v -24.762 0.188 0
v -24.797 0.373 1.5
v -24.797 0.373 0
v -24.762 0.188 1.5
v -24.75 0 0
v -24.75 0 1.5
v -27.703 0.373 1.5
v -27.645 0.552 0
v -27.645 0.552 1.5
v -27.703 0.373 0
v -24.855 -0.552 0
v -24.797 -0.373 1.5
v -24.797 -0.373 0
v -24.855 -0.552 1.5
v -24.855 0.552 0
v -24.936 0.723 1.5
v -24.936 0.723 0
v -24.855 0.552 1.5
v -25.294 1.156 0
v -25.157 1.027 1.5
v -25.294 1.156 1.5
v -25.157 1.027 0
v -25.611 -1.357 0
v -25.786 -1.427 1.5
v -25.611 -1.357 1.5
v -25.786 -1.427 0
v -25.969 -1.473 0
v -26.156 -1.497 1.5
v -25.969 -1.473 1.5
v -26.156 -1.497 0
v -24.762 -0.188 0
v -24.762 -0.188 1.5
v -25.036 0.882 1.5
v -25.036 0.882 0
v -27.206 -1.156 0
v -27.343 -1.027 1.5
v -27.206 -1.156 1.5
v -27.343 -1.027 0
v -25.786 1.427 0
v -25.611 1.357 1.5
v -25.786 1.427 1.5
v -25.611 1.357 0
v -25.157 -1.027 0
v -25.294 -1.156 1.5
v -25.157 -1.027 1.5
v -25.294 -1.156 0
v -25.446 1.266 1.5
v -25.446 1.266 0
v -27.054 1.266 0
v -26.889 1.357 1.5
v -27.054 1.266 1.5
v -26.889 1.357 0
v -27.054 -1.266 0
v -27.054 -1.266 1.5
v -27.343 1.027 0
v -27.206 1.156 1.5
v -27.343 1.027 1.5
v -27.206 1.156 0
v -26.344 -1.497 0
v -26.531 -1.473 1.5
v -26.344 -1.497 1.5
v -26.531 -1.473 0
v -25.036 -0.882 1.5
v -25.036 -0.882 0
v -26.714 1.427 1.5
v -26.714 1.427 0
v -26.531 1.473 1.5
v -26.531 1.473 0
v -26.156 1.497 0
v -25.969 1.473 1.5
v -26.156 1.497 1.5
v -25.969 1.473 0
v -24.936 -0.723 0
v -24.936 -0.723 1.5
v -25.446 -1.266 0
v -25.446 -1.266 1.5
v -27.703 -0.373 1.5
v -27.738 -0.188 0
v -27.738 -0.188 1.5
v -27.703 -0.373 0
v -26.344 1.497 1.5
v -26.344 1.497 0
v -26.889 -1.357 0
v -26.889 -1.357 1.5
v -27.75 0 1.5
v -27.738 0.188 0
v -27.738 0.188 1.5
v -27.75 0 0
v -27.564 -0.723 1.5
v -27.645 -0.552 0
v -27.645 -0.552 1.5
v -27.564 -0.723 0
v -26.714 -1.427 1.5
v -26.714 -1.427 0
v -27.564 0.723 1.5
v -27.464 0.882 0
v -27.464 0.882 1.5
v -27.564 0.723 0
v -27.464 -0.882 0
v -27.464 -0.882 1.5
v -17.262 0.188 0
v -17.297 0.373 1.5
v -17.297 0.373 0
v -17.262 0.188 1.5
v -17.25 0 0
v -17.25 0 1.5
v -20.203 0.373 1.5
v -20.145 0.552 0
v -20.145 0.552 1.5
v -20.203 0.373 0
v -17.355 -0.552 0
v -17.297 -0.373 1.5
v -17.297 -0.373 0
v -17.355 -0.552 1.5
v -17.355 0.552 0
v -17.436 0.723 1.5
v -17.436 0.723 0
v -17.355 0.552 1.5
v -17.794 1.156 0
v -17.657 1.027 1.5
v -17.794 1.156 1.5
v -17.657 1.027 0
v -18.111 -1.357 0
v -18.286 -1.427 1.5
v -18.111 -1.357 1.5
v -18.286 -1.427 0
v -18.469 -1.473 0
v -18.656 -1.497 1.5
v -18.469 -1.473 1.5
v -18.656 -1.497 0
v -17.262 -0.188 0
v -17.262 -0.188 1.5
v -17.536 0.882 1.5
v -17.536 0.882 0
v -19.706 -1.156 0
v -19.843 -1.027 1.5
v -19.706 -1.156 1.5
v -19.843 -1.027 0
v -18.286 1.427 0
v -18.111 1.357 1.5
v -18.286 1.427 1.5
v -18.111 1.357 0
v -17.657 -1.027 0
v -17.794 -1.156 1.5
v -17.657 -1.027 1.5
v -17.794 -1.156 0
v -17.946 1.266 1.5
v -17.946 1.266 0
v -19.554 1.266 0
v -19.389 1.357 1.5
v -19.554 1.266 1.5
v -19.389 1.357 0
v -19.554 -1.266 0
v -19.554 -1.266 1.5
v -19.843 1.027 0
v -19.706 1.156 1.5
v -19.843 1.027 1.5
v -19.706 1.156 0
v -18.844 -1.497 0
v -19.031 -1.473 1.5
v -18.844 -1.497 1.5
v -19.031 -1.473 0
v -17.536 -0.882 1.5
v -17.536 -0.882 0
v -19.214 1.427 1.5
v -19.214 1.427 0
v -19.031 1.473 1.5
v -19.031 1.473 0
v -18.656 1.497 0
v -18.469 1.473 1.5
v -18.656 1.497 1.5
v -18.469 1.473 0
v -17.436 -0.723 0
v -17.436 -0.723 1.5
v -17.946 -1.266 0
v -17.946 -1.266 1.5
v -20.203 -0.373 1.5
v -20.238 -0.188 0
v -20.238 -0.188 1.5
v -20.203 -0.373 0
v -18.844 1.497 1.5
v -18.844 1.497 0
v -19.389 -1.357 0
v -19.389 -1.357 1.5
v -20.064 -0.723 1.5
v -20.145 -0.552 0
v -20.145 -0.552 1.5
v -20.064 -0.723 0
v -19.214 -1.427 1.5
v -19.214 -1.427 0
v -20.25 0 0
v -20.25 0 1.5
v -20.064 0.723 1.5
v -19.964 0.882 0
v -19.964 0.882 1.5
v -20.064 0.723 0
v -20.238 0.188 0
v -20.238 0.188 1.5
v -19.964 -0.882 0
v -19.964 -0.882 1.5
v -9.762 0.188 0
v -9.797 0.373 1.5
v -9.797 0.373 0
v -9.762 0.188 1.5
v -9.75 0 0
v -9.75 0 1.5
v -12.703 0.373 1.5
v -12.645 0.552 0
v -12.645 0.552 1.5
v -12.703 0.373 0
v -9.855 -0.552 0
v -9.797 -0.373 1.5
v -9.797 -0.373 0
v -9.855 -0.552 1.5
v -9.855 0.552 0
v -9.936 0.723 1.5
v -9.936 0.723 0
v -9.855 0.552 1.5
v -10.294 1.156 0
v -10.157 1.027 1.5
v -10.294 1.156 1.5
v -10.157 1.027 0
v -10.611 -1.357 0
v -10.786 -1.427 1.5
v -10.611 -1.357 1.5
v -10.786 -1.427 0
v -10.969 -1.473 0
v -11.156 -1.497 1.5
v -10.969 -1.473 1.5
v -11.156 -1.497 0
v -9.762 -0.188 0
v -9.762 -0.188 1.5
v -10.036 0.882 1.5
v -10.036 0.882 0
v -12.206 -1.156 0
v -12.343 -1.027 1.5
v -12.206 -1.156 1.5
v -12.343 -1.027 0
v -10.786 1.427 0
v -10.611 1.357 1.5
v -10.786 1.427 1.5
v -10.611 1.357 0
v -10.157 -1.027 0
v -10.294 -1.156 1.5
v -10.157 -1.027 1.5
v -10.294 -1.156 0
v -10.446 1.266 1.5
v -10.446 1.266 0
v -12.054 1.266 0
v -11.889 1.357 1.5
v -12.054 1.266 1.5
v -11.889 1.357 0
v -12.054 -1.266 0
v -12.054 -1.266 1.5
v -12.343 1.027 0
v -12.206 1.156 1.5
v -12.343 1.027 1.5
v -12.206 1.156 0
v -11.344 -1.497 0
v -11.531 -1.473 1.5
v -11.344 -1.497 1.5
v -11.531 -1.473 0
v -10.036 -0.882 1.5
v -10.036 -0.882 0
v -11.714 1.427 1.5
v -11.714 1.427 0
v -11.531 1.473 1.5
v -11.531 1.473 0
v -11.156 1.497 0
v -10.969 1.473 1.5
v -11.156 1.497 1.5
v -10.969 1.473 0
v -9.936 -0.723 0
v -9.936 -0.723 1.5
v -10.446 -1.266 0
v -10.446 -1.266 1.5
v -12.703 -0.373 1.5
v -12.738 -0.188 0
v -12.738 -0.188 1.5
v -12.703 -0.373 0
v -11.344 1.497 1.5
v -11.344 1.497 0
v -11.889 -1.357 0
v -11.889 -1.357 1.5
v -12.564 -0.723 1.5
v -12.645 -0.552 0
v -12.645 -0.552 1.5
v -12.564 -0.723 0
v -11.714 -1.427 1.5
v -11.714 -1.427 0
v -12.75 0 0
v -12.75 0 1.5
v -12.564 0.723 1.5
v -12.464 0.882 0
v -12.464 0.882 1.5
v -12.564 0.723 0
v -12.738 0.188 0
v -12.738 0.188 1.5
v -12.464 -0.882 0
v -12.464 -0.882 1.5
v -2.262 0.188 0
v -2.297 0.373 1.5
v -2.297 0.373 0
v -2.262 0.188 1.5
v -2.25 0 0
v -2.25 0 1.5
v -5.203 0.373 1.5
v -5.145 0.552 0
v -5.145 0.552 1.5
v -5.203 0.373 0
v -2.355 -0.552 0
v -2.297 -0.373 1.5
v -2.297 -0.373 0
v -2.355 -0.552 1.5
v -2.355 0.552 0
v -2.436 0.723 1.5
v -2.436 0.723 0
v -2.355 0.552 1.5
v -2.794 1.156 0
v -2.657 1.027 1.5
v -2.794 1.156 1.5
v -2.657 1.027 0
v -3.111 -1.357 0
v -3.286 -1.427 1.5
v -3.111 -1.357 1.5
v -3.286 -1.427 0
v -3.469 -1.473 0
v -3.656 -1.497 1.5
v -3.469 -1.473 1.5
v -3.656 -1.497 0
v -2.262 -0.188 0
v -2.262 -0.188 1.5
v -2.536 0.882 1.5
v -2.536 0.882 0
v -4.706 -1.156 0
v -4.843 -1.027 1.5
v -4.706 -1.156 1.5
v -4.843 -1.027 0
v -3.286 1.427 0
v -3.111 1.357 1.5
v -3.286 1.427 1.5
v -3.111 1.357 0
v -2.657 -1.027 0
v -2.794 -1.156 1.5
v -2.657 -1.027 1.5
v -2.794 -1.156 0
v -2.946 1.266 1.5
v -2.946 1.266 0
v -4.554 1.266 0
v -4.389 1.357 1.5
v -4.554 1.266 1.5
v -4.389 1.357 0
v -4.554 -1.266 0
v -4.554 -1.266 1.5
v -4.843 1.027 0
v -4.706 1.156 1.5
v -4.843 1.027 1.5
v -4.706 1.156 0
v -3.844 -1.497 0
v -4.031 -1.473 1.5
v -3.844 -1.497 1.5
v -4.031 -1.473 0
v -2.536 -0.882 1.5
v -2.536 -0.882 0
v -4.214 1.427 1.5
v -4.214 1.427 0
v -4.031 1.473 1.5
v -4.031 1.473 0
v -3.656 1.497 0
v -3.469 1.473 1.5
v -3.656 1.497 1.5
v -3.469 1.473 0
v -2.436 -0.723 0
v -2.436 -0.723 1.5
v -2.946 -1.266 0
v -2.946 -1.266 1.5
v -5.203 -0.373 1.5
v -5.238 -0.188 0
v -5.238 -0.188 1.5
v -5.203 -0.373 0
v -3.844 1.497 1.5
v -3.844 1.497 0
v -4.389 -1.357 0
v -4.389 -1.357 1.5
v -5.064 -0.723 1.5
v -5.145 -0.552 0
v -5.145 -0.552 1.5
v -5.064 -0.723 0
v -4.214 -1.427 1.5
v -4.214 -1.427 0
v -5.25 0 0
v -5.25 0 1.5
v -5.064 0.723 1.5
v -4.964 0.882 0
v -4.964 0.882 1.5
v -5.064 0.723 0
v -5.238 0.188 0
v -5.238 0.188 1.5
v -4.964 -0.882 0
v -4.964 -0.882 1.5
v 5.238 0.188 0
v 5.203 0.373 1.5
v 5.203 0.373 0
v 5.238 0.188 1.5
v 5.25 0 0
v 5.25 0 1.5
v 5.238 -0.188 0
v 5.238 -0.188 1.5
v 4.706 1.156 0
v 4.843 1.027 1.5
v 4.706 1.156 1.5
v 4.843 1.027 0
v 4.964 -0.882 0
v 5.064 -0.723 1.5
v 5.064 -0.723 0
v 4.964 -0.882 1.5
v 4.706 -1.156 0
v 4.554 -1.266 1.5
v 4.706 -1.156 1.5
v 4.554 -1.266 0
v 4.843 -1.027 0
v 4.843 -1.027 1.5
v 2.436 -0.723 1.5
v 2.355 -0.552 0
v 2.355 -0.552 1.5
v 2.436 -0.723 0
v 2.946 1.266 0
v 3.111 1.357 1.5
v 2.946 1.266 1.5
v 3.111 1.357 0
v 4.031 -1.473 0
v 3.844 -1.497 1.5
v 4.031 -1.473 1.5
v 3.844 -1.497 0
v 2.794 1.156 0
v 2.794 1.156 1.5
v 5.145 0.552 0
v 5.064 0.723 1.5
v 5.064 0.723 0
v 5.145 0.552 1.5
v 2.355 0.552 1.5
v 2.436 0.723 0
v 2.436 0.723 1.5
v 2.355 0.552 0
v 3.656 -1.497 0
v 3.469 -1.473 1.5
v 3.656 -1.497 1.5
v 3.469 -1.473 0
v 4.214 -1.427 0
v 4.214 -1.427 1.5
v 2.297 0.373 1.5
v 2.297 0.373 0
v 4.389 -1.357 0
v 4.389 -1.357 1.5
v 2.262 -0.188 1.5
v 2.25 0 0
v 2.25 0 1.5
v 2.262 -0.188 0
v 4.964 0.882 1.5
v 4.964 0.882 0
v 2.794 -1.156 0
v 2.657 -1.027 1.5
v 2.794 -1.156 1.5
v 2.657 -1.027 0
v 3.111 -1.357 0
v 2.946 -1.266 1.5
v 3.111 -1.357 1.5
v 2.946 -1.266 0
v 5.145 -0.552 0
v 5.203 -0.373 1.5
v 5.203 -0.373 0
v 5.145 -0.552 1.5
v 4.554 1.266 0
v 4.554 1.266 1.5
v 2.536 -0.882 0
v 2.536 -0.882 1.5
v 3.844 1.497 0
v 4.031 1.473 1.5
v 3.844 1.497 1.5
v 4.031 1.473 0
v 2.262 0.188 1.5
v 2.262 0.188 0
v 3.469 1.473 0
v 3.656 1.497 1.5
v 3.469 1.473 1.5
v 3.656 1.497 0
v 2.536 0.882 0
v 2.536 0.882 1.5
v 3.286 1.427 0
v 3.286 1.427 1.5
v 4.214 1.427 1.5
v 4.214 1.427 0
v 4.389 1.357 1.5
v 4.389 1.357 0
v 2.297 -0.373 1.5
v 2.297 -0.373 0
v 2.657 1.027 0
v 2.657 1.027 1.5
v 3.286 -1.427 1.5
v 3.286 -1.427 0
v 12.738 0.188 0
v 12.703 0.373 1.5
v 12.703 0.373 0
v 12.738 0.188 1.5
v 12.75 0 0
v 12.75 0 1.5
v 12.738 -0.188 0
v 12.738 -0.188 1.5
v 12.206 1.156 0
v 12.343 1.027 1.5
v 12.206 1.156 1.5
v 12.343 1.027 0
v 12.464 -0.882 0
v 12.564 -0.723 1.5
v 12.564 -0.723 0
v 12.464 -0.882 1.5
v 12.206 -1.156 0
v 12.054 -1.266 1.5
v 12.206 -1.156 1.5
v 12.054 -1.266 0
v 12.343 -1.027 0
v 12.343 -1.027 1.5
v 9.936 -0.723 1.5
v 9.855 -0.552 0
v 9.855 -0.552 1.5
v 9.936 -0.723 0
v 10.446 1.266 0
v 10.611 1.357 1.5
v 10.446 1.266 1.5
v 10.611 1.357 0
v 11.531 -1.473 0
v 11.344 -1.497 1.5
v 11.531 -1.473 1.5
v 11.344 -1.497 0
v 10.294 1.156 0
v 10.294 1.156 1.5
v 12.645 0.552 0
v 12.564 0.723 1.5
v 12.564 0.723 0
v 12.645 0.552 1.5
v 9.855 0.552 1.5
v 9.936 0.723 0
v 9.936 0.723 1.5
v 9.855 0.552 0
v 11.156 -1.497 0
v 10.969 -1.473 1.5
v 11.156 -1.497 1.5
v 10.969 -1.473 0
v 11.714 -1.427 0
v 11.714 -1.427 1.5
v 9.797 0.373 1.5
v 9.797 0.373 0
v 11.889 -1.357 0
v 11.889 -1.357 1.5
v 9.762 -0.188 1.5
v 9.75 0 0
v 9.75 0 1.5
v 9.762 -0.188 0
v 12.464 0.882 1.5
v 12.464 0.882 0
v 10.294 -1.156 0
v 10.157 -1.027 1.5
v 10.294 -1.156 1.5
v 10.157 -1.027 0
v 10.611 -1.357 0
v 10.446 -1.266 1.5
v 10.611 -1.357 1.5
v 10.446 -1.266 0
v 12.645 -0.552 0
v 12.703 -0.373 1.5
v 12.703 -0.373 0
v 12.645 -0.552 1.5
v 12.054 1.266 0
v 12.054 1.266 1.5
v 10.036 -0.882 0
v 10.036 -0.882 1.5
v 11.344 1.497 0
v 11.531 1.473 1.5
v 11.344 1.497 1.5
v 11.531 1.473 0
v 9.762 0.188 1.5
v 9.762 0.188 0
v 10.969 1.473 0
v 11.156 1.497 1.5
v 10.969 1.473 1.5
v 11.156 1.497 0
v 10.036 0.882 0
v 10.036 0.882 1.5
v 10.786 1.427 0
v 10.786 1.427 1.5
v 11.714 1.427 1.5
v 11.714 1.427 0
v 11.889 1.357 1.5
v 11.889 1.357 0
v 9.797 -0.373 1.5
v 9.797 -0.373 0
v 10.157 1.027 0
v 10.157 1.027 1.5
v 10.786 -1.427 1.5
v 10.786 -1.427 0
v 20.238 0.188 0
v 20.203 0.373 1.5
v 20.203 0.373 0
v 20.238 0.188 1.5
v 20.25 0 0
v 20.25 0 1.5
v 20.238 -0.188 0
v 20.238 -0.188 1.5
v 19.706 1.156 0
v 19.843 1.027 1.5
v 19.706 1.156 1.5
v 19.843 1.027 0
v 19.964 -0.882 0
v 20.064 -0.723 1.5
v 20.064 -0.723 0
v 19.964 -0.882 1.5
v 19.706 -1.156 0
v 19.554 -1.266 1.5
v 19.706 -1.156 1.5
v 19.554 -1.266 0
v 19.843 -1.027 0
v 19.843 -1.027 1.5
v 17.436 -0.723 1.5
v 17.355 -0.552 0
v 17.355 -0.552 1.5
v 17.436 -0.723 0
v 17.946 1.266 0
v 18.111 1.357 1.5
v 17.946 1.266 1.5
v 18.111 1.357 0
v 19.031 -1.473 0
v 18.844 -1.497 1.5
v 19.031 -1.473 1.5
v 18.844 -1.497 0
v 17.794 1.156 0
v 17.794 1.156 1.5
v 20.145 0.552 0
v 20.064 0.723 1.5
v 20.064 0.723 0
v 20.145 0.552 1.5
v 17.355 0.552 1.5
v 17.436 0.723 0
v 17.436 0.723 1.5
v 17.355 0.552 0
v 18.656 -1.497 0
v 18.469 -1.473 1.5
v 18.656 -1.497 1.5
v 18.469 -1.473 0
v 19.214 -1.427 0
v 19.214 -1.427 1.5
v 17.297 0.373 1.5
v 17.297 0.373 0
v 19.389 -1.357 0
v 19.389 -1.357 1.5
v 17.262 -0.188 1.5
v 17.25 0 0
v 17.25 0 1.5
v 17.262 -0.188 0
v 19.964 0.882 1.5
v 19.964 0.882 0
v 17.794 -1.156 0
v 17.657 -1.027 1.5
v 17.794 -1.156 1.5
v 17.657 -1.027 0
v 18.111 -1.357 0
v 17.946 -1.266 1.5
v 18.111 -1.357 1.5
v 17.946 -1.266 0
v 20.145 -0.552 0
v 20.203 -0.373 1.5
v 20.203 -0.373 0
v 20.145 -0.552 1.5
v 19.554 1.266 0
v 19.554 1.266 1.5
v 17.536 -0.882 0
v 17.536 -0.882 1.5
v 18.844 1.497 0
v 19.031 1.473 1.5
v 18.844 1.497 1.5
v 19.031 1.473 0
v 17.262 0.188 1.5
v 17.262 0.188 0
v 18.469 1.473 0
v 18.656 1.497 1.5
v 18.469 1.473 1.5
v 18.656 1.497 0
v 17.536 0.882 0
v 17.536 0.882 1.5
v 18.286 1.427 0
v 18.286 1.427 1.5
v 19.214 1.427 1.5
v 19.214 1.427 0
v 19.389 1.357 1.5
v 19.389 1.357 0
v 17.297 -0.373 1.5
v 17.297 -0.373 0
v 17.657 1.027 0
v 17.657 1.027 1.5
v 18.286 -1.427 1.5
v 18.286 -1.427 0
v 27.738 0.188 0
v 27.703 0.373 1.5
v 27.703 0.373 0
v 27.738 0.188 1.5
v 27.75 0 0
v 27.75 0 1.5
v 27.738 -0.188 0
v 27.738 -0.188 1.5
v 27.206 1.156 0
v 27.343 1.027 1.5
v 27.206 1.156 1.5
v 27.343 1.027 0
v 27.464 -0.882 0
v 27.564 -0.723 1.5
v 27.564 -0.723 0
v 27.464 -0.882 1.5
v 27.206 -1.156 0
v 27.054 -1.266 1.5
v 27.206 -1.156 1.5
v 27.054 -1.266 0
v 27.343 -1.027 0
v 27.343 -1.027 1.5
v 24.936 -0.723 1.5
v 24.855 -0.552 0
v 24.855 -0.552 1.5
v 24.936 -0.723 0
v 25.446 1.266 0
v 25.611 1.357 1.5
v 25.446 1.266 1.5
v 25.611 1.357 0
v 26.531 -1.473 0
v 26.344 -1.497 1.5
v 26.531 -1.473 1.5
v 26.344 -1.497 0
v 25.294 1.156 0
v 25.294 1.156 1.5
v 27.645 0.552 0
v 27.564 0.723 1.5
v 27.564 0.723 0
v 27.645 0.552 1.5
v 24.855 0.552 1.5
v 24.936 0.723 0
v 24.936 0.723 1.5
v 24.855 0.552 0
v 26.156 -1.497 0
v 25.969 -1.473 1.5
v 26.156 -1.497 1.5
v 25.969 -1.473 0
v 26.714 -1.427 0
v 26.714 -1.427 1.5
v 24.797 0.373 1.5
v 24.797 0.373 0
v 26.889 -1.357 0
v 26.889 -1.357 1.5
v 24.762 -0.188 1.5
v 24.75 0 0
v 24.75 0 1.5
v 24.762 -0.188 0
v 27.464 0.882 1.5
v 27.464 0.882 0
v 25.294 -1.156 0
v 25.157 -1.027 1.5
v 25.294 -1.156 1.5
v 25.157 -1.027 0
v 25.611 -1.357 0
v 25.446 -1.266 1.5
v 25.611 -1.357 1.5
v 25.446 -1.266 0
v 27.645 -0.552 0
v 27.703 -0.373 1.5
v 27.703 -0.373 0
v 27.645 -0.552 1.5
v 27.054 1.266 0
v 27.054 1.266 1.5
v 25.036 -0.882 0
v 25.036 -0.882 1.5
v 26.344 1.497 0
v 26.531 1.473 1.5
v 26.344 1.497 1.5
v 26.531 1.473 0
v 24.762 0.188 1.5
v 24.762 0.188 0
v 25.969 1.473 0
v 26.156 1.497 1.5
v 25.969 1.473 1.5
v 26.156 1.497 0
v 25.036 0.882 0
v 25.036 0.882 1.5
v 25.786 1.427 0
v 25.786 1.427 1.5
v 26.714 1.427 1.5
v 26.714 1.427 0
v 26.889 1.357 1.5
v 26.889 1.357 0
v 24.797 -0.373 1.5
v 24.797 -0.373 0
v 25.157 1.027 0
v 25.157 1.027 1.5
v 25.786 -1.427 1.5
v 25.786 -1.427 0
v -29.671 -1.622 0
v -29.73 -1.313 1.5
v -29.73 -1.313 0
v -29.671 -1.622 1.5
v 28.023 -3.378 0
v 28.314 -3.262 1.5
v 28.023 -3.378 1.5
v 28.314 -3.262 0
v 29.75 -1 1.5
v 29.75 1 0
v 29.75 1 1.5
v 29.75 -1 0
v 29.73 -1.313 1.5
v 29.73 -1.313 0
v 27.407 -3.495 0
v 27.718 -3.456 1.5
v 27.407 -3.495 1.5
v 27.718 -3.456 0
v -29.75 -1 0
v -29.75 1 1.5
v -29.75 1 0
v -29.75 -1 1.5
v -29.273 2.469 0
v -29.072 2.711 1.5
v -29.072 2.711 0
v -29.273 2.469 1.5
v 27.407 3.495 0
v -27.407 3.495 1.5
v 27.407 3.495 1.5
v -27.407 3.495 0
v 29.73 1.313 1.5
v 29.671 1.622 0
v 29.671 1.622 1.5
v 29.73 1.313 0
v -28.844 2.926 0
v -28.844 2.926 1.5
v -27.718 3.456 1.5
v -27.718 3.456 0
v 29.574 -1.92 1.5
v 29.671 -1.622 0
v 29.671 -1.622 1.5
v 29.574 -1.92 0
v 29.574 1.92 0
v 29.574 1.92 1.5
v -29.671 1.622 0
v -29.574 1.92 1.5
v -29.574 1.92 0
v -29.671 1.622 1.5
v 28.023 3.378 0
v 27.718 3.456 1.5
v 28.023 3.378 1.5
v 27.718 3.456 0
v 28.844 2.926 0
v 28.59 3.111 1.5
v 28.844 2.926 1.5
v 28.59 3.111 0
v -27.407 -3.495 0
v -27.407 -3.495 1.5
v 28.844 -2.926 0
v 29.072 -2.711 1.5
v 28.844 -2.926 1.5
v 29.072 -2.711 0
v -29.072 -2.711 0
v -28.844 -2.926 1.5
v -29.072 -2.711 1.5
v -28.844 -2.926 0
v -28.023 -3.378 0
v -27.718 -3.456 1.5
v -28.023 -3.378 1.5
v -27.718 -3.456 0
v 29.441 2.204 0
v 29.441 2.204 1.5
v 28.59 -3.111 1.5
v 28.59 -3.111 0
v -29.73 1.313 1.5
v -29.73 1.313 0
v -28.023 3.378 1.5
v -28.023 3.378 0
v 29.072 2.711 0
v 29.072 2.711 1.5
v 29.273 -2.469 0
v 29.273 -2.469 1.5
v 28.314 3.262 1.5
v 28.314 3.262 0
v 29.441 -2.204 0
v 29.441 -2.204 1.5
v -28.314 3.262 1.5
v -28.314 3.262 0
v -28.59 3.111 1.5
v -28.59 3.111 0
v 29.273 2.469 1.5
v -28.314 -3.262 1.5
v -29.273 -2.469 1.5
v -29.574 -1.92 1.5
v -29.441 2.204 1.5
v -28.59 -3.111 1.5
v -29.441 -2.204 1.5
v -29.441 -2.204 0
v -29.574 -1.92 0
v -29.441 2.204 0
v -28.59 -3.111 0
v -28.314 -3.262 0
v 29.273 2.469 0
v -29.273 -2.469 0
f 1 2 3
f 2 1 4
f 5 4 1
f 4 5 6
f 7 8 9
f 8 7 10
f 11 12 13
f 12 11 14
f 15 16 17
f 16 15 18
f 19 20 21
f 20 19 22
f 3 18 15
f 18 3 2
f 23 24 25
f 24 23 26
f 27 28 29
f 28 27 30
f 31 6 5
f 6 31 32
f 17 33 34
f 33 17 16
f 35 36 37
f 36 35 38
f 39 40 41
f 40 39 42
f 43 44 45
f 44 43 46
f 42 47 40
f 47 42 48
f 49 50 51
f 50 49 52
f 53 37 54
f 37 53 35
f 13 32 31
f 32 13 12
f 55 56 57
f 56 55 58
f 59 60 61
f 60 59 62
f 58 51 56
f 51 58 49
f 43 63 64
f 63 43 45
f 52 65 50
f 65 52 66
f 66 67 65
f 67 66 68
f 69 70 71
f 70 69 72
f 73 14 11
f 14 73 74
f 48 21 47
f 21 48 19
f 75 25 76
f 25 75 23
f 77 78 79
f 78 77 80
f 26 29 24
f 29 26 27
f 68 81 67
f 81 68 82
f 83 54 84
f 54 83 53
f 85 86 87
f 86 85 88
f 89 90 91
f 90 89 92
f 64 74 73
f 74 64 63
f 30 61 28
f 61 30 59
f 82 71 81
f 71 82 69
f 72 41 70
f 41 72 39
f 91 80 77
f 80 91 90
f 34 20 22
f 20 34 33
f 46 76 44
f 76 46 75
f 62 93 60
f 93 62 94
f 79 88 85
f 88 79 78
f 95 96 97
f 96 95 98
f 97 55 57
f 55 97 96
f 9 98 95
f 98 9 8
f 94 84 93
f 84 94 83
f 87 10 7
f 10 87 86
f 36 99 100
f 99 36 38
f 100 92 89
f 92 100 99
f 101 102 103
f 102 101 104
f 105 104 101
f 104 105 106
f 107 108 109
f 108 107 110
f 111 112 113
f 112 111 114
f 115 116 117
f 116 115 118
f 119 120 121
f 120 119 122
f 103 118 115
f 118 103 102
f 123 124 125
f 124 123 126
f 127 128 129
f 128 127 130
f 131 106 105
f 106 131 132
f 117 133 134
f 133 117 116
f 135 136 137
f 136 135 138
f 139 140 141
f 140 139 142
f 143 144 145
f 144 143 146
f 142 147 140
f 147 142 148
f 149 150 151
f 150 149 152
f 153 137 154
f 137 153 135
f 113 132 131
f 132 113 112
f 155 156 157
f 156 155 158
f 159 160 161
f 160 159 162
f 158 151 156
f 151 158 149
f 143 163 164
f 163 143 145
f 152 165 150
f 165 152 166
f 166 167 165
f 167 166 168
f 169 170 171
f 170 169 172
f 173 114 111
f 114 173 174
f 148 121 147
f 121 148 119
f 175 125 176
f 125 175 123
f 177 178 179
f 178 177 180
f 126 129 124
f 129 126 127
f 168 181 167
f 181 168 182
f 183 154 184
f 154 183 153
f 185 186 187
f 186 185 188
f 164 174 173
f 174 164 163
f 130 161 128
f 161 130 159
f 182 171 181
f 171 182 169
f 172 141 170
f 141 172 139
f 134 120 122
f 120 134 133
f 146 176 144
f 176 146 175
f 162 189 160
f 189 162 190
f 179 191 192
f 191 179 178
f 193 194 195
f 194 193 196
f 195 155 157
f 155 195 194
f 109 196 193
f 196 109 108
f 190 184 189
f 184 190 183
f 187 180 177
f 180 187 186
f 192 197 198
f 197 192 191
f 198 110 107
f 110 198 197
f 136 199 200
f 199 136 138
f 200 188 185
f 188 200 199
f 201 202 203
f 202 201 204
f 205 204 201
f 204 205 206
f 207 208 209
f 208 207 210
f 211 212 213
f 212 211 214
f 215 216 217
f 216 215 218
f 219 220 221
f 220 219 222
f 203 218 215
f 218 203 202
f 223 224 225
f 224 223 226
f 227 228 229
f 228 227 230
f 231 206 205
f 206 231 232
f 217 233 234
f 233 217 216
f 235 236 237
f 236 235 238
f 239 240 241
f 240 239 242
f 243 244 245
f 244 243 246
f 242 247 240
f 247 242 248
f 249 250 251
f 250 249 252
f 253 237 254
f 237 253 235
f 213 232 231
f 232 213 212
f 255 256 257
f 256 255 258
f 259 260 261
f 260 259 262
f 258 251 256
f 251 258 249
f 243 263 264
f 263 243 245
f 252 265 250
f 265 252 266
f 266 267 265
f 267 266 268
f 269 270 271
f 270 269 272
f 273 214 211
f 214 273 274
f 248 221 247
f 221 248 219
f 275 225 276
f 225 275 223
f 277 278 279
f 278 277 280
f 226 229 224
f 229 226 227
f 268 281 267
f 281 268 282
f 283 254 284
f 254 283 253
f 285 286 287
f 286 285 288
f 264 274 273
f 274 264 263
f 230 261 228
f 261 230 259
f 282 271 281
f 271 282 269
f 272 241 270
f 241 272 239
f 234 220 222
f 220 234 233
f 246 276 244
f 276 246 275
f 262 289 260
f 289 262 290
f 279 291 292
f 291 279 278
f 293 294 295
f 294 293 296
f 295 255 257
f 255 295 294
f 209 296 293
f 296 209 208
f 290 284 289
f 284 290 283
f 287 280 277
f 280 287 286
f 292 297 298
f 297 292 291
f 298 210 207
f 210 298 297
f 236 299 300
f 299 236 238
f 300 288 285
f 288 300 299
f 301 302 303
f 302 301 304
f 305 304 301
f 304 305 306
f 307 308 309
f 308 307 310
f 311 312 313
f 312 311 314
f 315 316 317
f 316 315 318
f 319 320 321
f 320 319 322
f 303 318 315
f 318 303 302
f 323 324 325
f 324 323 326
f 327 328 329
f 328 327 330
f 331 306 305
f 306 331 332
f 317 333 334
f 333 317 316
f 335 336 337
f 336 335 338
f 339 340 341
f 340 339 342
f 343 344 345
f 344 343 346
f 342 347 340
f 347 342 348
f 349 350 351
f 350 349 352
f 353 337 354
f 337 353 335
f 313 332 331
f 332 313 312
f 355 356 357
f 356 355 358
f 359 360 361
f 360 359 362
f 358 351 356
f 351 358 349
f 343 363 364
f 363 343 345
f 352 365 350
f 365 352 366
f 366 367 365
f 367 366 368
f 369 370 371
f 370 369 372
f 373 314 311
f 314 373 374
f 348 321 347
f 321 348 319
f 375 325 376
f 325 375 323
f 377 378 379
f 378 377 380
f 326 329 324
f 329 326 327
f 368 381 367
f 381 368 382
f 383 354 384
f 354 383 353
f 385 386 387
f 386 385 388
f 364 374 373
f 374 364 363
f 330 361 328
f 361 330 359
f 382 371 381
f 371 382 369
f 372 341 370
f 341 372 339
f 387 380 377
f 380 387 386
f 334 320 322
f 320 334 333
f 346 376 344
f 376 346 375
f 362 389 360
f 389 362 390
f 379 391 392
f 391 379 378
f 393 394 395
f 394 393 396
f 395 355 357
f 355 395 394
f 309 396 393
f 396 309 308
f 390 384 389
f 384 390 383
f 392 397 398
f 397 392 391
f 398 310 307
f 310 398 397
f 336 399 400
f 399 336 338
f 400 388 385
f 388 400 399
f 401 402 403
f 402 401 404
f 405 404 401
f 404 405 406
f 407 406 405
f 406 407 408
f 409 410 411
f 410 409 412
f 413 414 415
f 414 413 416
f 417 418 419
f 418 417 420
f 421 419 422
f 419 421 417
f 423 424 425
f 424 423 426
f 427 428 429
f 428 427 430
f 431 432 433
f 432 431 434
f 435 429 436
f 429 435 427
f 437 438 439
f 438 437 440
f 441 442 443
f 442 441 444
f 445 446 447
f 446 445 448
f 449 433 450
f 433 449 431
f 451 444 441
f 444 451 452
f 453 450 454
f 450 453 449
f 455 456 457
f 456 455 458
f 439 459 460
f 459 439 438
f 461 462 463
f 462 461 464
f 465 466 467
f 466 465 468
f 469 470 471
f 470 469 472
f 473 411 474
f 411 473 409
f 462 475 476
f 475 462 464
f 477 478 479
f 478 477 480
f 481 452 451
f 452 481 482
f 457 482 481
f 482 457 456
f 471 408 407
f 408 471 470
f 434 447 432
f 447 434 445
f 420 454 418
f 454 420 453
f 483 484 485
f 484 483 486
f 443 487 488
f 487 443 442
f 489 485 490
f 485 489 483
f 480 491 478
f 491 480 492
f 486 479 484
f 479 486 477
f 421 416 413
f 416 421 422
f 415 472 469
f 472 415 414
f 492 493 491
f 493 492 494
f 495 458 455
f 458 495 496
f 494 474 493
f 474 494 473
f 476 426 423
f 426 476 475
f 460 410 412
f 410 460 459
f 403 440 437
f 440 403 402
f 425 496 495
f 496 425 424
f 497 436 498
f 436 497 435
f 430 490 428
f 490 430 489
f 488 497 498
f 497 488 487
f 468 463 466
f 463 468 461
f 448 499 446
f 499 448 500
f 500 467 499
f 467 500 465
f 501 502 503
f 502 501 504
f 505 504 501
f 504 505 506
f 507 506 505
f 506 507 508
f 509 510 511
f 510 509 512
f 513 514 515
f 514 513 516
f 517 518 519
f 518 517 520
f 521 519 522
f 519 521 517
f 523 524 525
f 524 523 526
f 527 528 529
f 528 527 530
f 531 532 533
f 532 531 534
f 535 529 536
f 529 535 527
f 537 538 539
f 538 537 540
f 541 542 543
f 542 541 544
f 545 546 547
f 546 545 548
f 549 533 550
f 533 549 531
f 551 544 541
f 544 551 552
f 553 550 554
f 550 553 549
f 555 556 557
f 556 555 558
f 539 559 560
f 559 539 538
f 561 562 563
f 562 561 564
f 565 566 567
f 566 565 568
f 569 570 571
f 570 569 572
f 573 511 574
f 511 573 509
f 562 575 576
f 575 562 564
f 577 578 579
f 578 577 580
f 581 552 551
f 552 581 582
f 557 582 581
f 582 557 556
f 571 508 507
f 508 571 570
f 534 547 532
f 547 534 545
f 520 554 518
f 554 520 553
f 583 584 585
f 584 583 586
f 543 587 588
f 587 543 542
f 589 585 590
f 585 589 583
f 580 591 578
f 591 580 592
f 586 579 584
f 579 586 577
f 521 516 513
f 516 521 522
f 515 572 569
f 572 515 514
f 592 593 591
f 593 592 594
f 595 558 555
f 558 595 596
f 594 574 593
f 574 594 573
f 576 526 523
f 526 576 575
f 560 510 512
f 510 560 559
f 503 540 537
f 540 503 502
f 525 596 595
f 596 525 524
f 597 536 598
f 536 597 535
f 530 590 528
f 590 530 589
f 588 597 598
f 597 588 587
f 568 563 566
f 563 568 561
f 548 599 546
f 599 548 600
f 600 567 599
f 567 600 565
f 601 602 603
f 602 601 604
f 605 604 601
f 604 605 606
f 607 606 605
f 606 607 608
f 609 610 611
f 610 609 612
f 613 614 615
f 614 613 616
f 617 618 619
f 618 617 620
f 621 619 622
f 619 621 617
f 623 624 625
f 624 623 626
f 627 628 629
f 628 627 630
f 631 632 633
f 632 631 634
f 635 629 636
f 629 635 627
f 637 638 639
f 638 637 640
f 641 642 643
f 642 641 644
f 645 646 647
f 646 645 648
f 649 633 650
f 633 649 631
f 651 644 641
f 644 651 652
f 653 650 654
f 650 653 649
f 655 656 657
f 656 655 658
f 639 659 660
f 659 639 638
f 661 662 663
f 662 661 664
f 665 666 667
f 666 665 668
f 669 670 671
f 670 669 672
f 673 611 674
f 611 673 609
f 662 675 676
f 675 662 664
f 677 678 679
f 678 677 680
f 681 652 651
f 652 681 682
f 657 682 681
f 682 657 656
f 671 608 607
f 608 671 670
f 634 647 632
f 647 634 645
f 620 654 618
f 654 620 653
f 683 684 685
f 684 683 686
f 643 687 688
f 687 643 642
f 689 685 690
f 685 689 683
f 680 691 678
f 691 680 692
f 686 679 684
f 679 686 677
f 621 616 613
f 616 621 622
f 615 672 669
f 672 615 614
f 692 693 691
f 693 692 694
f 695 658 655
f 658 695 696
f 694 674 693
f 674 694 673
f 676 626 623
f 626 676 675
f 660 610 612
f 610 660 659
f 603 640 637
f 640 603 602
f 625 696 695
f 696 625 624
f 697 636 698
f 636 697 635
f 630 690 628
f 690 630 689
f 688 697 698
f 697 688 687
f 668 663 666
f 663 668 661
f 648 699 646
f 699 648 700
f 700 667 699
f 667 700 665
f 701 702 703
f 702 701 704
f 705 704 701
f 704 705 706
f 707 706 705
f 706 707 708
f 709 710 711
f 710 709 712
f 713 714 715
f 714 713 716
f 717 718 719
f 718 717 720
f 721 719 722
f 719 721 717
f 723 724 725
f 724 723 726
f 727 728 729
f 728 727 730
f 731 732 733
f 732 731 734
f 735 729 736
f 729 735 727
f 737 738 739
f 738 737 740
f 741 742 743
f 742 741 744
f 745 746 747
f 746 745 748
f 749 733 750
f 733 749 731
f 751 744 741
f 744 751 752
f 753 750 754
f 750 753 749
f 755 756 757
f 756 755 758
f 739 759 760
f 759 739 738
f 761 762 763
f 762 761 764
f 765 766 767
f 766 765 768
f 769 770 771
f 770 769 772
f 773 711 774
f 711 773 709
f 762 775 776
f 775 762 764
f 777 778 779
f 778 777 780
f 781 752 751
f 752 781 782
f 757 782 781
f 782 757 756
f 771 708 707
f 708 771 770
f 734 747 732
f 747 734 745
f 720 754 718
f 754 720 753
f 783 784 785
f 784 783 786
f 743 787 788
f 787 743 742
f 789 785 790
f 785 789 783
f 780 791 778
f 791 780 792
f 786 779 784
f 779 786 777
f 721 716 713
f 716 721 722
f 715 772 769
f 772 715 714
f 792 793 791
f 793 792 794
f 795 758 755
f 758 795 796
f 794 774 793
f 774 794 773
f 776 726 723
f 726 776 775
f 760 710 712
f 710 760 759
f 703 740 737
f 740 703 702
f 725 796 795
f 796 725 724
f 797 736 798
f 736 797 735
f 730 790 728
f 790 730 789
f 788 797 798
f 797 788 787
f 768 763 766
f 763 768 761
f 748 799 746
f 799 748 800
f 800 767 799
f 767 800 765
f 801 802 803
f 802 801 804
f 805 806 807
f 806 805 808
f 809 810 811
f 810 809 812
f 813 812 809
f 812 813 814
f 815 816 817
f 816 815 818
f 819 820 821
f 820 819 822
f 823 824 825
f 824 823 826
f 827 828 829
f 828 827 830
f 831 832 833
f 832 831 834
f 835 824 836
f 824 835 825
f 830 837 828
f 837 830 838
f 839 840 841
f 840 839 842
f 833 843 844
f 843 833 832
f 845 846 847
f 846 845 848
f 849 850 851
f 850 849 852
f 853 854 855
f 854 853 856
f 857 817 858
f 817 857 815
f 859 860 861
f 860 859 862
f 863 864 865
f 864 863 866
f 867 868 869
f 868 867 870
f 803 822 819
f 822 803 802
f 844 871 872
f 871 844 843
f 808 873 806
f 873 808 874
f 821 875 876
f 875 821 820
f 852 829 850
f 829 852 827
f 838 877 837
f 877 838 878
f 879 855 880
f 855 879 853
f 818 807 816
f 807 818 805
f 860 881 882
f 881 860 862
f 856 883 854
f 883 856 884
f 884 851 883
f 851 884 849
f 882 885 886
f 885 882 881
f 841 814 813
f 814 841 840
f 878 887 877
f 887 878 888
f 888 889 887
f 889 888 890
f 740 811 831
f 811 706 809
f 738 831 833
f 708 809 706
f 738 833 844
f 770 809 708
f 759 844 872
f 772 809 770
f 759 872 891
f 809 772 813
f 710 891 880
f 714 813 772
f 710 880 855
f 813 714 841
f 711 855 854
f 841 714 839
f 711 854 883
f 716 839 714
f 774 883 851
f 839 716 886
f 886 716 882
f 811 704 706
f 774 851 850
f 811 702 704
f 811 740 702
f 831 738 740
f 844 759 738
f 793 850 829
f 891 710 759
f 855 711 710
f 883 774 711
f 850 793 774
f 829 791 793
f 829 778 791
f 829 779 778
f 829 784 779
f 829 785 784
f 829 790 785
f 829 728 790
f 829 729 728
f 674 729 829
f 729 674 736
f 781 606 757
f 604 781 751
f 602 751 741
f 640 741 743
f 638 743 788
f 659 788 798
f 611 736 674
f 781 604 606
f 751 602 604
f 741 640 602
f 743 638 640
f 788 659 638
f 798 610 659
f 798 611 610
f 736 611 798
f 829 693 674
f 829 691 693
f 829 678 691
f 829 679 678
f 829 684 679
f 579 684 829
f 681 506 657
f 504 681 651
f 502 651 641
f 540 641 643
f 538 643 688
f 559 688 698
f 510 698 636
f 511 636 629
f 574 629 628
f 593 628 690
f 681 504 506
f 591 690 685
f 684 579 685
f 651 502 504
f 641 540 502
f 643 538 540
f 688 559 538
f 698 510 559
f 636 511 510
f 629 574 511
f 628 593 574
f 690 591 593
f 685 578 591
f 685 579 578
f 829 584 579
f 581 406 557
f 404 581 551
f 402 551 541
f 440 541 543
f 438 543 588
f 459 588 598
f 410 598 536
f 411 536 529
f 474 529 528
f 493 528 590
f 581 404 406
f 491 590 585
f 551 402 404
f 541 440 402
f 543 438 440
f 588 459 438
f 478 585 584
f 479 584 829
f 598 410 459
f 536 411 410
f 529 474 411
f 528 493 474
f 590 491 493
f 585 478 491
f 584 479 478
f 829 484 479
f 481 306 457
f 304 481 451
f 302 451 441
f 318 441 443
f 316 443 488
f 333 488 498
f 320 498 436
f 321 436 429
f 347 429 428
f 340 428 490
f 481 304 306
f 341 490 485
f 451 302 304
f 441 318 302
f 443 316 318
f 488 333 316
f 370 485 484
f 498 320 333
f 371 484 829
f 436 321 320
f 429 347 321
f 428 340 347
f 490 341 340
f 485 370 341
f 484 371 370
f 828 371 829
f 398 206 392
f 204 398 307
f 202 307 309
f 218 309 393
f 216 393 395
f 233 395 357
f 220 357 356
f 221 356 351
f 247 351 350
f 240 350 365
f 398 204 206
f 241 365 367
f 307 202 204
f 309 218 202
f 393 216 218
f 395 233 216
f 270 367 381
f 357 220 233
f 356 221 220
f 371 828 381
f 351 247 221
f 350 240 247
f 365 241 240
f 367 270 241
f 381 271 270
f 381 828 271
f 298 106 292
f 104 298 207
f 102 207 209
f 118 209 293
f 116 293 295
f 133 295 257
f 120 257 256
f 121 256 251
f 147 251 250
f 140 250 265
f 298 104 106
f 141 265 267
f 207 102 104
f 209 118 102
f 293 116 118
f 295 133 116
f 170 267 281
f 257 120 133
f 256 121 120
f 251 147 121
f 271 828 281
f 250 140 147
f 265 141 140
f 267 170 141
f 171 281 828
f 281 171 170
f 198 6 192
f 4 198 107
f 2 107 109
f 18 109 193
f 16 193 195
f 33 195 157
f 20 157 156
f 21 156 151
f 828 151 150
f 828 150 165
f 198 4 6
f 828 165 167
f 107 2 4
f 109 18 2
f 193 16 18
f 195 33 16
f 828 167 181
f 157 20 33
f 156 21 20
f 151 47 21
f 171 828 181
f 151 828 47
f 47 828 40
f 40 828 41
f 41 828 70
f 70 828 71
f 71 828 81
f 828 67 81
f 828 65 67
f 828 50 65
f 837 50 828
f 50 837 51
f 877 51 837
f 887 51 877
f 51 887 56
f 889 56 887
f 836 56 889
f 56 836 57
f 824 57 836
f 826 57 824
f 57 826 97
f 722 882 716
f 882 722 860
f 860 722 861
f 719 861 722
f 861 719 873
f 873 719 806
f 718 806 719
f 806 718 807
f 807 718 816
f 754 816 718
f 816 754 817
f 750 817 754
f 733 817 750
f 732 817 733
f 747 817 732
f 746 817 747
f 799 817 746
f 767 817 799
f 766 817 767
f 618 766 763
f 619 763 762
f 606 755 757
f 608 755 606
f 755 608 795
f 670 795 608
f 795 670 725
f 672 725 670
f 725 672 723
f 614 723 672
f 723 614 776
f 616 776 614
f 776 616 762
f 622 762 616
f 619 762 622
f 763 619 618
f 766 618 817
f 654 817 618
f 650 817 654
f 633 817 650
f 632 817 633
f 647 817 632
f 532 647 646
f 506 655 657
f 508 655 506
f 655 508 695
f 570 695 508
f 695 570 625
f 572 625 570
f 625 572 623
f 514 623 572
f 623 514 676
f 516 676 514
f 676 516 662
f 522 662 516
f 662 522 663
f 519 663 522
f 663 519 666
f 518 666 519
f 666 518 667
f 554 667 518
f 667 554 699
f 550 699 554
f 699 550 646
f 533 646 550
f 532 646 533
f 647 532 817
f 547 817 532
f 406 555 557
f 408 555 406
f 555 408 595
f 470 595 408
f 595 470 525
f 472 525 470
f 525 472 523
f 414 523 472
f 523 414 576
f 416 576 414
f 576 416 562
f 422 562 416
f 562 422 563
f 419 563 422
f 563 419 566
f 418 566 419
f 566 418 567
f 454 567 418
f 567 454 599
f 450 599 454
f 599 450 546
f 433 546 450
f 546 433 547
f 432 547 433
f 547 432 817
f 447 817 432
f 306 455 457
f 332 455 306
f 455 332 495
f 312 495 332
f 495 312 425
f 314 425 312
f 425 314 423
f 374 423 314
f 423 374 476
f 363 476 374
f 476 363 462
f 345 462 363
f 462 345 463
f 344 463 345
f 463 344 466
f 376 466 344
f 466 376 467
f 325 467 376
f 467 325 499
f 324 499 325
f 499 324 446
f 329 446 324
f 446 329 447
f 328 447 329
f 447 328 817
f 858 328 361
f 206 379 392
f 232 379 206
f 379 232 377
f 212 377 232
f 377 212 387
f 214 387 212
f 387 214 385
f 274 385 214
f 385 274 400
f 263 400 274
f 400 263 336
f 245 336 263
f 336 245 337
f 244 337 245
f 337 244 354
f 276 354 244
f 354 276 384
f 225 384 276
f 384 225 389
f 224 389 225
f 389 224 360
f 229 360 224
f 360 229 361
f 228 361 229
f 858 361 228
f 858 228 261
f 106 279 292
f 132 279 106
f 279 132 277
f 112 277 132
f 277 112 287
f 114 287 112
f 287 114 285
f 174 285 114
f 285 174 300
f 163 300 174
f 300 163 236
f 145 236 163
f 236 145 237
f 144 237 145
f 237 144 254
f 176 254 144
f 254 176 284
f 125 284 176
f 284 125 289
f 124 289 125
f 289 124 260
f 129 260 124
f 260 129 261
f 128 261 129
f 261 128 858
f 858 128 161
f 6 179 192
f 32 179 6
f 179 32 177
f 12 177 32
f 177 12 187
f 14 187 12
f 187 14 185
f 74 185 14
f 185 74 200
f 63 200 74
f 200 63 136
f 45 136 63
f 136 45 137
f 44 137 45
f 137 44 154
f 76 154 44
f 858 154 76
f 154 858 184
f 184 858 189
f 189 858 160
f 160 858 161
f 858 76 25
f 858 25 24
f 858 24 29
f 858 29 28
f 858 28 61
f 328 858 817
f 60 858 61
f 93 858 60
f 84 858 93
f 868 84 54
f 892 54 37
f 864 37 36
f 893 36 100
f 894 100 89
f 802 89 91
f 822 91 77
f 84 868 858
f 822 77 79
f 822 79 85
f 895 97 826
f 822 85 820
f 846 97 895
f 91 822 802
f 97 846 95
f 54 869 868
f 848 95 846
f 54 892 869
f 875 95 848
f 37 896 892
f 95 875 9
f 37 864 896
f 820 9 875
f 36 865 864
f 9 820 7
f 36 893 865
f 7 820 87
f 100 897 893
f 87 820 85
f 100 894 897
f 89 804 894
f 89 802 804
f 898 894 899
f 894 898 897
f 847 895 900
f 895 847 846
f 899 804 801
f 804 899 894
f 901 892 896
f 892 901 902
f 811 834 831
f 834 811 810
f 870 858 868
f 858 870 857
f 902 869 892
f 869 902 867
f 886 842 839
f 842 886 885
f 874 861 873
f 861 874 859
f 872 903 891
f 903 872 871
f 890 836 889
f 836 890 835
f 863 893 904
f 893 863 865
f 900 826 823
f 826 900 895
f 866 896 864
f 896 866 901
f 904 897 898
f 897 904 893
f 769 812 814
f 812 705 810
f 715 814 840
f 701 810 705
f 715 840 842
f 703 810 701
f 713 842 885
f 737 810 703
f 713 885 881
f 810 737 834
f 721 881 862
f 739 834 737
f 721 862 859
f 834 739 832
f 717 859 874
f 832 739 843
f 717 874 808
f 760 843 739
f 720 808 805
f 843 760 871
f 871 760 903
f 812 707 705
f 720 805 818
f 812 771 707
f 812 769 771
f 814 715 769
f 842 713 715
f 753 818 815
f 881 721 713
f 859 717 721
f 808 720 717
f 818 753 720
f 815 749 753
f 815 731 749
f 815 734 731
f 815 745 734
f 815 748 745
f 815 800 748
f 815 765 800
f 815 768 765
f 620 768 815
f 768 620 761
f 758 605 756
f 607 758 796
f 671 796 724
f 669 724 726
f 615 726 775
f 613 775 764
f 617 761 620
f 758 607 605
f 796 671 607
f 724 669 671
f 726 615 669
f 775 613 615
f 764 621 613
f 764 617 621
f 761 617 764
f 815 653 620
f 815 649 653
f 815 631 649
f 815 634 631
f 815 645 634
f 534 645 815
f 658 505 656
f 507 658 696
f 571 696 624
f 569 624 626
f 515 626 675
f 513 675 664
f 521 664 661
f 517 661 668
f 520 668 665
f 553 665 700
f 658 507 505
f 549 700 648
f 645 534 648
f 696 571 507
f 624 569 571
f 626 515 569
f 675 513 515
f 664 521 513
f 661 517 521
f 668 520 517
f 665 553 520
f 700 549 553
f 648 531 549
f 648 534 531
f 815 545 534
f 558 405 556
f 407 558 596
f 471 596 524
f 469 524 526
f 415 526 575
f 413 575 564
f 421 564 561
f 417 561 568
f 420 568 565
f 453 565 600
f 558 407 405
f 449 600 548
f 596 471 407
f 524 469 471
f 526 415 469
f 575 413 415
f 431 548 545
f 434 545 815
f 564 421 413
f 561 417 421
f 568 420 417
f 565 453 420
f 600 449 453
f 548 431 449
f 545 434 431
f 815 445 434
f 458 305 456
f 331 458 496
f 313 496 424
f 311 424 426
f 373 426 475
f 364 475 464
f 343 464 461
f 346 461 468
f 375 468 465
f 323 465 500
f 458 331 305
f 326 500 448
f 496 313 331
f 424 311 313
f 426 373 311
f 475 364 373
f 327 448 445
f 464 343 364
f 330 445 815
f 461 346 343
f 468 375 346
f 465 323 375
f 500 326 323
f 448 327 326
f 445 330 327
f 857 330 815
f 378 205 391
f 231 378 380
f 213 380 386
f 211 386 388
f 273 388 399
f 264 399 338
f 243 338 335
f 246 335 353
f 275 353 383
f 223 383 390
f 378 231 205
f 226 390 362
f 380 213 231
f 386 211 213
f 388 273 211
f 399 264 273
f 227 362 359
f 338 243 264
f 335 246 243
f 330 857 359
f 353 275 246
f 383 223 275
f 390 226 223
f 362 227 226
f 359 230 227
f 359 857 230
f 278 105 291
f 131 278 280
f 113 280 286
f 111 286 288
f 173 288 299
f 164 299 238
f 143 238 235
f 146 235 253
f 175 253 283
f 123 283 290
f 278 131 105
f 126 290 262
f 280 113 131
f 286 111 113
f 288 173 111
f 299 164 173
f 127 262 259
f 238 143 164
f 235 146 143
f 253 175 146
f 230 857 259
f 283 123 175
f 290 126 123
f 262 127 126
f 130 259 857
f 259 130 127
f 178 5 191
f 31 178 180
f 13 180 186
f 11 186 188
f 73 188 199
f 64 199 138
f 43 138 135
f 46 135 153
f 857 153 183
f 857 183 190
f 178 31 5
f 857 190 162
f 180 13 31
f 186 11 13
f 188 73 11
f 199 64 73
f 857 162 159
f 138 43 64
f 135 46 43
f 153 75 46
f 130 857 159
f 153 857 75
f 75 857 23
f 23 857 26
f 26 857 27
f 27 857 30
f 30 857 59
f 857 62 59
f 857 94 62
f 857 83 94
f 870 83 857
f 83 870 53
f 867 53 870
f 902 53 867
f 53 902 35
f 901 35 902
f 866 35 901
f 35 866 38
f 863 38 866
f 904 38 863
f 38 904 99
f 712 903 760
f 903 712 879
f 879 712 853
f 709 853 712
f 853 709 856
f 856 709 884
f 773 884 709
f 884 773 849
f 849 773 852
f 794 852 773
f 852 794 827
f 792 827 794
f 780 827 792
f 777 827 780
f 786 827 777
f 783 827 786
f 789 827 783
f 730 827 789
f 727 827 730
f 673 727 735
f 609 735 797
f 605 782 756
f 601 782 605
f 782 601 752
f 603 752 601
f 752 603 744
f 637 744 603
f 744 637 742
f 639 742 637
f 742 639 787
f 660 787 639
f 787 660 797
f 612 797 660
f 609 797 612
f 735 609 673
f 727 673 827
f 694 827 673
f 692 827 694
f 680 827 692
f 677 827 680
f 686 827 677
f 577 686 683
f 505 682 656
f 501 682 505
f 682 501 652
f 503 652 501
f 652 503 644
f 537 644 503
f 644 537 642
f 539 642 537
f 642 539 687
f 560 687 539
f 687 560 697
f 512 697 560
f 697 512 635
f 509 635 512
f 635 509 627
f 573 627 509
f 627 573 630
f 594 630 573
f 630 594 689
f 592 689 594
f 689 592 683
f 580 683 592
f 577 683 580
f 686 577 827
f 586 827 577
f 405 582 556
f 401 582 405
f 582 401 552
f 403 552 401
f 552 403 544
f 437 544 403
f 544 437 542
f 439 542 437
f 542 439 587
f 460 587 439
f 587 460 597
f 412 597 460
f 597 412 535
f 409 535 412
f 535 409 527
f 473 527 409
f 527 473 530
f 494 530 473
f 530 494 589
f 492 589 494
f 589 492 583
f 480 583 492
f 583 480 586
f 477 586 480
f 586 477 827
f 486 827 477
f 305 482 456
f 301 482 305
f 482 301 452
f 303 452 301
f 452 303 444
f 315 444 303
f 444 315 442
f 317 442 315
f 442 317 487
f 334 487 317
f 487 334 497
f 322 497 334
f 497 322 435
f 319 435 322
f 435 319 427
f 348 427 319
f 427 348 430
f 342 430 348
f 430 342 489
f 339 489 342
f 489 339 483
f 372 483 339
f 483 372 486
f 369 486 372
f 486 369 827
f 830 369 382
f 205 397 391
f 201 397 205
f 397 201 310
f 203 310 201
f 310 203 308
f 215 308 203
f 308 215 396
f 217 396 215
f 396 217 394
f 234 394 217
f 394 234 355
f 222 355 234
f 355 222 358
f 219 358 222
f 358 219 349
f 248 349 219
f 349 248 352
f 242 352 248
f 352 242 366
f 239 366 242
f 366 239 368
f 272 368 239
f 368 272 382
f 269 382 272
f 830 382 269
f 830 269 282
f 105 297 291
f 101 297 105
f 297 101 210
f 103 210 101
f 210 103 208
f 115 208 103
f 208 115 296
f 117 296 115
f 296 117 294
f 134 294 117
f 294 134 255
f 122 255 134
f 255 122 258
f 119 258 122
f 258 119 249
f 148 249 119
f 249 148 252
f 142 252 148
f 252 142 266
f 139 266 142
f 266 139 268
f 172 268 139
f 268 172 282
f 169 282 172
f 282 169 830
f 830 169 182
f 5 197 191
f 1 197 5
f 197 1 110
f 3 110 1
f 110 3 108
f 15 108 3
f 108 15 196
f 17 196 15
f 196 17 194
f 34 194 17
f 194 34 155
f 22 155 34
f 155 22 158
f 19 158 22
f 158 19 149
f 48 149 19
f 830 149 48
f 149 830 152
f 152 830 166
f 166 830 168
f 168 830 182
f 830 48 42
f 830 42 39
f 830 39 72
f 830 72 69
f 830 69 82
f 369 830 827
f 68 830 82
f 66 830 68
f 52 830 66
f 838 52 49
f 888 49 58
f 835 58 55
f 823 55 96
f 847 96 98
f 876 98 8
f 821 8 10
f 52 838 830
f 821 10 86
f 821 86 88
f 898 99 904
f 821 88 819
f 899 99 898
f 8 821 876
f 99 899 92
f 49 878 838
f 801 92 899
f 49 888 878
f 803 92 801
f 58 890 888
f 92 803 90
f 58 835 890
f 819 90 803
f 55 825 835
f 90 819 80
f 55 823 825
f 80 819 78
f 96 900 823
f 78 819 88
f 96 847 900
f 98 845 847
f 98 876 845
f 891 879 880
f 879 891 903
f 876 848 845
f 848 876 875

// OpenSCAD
$fn = 50;


difference() {
	union() {
		translate(v = [0, 0, 0]) {
			rotate(a = [0, 0, 0]) {
				hull() {
					translate(v = [-27.2500000000, 1.0000000000, 0]) {
						rotate(a = [0, 0, 0]) {
							translate(v = [0, 0, 0]) {
								rotate(a = [0, 0, 0]) {
									cylinder(h = 1.5000000000, r = 2.5000000000);
								}
							}
						}
					}
					translate(v = [27.2500000000, 1.0000000000, 0]) {
						rotate(a = [0, 0, 0]) {
							translate(v = [0, 0, 0]) {
								rotate(a = [0, 0, 0]) {
									cylinder(h = 1.5000000000, r = 2.5000000000);
								}
							}
						}
					}
					translate(v = [-27.2500000000, -1.0000000000, 0]) {
						rotate(a = [0, 0, 0]) {
							translate(v = [0, 0, 0]) {
								rotate(a = [0, 0, 0]) {
									cylinder(h = 1.5000000000, r = 2.5000000000);
								}
							}
						}
					}
					translate(v = [27.2500000000, -1.0000000000, 0]) {
						rotate(a = [0, 0, 0]) {
							translate(v = [0, 0, 0]) {
								rotate(a = [0, 0, 0]) {
									cylinder(h = 1.5000000000, r = 2.5000000000);
								}
							}
						}
					}
				}
			}
		}
	}
	union() {
		translate(v = [-26.2500000000, 0.0000000000, 0]) {
			rotate(a = [0, 0, 0]) {
				translate(v = [0, 0, -50]) {
					rotate(a = [0, 0, 0]) {
						cylinder(h = 100, r = 1.5000000000);
					}
				}
			}
		}
		translate(v = [-18.7500000000, 0.0000000000, 0]) {
			rotate(a = [0, 0, 0]) {
				translate(v = [0, 0, -50]) {
					rotate(a = [0, 0, 0]) {
						cylinder(h = 100, r = 1.5000000000);
					}
				}
			}
		}
		translate(v = [-11.2500000000, 0.0000000000, 0]) {
			rotate(a = [0, 0, 0]) {
				translate(v = [0, 0, -50]) {
					rotate(a = [0, 0, 0]) {
						cylinder(h = 100, r = 1.5000000000);
					}
				}
			}
		}
		translate(v = [-3.7500000000, 0.0000000000, 0]) {
			rotate(a = [0, 0, 0]) {
				translate(v = [0, 0, -50]) {
					rotate(a = [0, 0, 0]) {
						cylinder(h = 100, r = 1.5000000000);
					}
				}
			}
		}
		translate(v = [3.7500000000, 0.0000000000, 0]) {
			rotate(a = [0, 0, 0]) {
				translate(v = [0, 0, -50]) {
					rotate(a = [0, 0, 0]) {
						cylinder(h = 100, r = 1.5000000000);
					}
				}
			}
		}
		translate(v = [11.2500000000, 0.0000000000, 0]) {
			rotate(a = [0, 0, 0]) {
				translate(v = [0, 0, -50]) {
					rotate(a = [0, 0, 0]) {
						cylinder(h = 100, r = 1.5000000000);
					}
				}
			}
		}
		translate(v = [18.7500000000, 0.0000000000, 0]) {
			rotate(a = [0, 0, 0]) {
				translate(v = [0, 0, -50]) {
					rotate(a = [0, 0, 0]) {
						cylinder(h = 100, r = 1.5000000000);
					}
				}
			}
		}
		translate(v = [26.2500000000, 0.0000000000, 0]) {
			rotate(a = [0, 0, 0]) {
				translate(v = [0, 0, -50]) {
					rotate(a = [0, 0, 0]) {
						cylinder(h = 100, r = 1.5000000000);
					}
				}
			}
		}
	}
}
